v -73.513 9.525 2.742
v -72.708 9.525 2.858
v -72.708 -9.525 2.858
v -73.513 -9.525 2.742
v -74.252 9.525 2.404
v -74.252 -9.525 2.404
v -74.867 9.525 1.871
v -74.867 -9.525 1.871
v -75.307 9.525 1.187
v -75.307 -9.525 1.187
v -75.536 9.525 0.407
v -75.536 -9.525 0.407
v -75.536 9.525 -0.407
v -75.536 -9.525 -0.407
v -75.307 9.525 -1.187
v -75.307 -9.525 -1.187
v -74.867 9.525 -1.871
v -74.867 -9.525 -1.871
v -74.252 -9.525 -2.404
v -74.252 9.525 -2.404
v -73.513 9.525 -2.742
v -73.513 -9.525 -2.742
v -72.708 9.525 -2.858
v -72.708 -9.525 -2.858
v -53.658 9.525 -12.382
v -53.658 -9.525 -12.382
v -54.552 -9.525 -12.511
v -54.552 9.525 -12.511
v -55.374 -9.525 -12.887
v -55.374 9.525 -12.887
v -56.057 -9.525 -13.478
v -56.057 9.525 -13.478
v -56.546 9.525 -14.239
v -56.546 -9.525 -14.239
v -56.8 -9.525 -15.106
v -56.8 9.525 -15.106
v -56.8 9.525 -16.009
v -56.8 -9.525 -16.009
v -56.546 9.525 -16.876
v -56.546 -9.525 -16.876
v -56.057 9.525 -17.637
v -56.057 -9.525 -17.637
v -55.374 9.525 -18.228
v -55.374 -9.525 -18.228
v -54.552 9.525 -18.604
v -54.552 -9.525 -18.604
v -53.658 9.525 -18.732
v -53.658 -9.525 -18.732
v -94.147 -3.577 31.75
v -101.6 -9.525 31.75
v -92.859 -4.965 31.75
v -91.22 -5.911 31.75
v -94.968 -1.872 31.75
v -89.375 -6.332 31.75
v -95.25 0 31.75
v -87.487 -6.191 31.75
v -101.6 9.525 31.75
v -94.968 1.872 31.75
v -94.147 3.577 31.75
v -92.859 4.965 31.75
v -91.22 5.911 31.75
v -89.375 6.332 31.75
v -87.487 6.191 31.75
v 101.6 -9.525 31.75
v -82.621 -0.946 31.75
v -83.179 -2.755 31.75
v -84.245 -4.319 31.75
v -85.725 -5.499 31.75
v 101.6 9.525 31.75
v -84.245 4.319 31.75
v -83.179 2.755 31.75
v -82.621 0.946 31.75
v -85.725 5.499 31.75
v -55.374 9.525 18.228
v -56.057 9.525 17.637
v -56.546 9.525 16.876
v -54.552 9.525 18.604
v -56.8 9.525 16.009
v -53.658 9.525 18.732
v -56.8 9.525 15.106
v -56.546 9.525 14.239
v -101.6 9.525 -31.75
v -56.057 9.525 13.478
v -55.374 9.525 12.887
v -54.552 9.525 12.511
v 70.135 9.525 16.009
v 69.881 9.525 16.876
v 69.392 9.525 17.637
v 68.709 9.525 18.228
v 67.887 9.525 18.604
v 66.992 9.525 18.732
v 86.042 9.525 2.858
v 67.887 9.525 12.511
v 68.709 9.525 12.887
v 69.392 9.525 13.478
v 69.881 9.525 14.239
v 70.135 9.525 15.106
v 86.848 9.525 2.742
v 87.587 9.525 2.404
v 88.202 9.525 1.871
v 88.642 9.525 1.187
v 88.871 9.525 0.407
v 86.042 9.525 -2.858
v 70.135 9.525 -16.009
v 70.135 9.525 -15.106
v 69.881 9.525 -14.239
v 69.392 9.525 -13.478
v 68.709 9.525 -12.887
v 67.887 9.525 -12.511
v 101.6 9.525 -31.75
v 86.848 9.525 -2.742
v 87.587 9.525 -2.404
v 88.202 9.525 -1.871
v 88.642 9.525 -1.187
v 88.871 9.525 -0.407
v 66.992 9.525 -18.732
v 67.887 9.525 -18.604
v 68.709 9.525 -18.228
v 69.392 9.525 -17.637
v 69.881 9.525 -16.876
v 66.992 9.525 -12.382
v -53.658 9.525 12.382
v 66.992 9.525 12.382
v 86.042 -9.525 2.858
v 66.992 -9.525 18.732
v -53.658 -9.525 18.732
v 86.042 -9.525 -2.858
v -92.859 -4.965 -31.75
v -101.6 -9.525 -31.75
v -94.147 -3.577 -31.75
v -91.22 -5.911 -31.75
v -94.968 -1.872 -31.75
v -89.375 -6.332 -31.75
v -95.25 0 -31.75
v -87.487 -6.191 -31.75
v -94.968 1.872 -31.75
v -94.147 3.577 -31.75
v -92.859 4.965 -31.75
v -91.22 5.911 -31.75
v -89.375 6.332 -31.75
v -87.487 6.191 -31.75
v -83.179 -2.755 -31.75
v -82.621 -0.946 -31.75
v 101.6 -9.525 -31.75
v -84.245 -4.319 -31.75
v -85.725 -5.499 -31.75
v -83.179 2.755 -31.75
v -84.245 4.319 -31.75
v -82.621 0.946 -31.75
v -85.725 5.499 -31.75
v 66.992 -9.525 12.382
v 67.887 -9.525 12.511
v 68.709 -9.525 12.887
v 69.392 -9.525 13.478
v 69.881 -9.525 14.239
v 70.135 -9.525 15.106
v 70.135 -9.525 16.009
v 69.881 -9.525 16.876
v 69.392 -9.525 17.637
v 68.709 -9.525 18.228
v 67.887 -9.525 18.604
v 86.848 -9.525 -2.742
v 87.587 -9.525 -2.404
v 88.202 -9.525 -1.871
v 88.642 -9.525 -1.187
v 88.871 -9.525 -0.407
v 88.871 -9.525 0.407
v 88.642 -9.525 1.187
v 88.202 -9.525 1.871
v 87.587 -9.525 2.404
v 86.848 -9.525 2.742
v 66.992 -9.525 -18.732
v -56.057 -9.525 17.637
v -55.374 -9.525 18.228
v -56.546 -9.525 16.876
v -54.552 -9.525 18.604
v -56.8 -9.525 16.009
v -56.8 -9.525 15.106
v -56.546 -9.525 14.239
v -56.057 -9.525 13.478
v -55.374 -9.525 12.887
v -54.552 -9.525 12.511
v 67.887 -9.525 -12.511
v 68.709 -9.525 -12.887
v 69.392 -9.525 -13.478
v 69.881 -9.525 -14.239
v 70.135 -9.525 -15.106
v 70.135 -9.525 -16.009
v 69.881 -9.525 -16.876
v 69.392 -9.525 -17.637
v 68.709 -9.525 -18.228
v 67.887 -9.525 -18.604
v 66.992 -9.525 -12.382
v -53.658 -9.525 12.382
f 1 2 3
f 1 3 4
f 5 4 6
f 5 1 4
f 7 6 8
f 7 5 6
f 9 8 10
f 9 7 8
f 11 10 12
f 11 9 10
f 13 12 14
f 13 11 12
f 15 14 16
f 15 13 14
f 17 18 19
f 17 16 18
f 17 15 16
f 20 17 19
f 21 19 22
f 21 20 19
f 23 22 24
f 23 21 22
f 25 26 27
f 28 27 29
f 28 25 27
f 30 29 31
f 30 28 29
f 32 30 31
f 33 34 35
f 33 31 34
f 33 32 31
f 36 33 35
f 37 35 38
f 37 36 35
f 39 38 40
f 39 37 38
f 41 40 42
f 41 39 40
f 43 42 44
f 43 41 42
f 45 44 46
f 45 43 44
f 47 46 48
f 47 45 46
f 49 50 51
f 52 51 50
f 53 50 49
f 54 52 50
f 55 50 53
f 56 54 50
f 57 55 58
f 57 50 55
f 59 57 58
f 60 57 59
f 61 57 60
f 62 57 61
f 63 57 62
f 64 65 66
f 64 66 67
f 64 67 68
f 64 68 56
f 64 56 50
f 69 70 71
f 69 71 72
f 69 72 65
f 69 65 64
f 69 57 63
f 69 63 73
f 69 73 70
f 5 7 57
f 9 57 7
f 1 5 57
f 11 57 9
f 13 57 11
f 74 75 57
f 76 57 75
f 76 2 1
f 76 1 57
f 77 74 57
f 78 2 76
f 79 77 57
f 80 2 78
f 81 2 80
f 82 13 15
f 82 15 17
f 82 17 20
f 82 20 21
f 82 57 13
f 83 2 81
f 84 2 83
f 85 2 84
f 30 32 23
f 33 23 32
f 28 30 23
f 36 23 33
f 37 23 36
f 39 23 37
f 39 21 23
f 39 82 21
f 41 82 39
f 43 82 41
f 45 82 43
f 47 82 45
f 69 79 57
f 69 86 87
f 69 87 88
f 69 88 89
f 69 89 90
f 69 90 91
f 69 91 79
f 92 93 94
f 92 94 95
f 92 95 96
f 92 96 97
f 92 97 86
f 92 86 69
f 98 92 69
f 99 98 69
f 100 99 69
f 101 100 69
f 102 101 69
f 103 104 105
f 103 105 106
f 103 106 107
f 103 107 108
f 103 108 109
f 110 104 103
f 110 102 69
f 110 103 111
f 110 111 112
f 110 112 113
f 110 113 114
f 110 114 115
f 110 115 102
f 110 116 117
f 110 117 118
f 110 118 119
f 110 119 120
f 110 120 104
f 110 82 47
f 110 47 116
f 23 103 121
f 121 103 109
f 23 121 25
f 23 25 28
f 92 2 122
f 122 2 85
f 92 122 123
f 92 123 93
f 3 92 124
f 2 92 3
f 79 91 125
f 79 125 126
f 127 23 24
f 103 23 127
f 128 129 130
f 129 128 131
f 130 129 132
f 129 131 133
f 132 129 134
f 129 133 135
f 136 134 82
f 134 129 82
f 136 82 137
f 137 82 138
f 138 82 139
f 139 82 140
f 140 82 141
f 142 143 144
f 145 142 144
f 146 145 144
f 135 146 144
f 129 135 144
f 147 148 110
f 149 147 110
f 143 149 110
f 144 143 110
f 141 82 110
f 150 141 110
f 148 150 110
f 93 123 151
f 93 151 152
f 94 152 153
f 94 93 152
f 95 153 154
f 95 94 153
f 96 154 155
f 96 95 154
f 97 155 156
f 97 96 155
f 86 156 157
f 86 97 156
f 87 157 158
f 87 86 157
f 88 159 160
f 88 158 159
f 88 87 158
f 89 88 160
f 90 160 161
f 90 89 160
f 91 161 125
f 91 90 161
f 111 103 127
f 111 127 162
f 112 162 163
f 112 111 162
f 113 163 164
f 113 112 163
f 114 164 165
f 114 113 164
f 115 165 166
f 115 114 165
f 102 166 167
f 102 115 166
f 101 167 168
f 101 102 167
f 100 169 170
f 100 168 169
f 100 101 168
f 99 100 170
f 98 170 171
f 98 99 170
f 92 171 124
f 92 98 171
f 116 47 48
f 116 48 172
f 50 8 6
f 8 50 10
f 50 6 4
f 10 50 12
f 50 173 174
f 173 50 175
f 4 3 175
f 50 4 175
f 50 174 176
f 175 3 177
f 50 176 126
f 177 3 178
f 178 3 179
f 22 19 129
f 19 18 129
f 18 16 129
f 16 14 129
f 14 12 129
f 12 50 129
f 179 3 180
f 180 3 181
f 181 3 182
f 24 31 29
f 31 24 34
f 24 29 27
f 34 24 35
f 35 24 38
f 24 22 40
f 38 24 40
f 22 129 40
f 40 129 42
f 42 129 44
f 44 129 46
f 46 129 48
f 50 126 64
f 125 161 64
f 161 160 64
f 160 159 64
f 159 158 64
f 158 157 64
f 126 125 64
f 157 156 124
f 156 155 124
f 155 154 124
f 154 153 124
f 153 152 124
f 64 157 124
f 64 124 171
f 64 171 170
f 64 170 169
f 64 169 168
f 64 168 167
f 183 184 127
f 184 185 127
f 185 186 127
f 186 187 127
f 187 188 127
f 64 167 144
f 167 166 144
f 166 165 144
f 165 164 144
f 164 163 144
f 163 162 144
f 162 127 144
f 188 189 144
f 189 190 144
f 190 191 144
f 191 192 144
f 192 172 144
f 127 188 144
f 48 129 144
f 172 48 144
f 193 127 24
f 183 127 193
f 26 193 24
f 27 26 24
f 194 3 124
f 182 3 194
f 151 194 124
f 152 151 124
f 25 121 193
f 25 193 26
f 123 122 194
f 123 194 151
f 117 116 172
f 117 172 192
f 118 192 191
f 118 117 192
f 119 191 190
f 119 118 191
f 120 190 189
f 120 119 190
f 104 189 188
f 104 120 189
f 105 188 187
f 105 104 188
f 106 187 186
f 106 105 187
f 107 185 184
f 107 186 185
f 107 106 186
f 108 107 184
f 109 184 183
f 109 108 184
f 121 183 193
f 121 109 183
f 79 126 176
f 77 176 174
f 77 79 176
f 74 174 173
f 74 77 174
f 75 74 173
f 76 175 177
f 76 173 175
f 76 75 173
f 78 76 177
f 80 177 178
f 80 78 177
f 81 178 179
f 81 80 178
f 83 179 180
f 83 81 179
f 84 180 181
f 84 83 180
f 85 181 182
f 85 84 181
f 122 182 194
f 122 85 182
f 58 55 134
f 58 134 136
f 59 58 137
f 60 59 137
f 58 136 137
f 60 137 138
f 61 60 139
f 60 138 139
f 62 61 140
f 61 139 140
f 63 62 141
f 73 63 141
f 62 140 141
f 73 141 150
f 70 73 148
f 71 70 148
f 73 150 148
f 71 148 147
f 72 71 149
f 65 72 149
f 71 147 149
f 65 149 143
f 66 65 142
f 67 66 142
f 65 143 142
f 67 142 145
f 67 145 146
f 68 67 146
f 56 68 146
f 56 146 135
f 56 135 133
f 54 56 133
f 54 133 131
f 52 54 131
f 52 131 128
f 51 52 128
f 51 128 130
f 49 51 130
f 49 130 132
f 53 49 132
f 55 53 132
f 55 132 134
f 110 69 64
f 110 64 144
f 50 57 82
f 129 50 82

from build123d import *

# Parameters (mm, degrees)
SKETCH1_W           = 203.2
SKETCH1_H           = 63.5
BOSS_EXTRUDE1_DEPTH = 9.525
CUT_EXTRUDE1_DEPTH  = 109.136603424
CUT_EXTRUDE2_REACH  = 122.19
SKETCH3_R           = 6.35


with BuildPart() as part:
    # Sketch1 → Boss-Extrude1 (new, symmetric)
    with BuildSketch(Plane(origin=(0, 0, 0), x_dir=(1, 0, 0), z_dir=(0, 1, 0))):
        Rectangle(SKETCH1_W, SKETCH1_H)
    extrude(amount=BOSS_EXTRUDE1_DEPTH, both=True)

    # Sketch2 → Cut-Extrude1 (cut, through all)
    with BuildSketch(Plane(origin=(0, 9.525, 0), x_dir=(1, 0, 0), z_dir=(0, 1, 0))):
        with BuildLine():
            Line((-72.7075, 2.8575), (86.0425, 2.8575))
            ThreePointArc((86.0425, 2.8575), (88.9, 0), (86.0425, -2.8575))
            Line((86.0425, -2.8575), (-72.7075, -2.8575))
            ThreePointArc((-72.7075, -2.8575), (-75.565, 0), (-72.7075, 2.8575))
        make_face()
        with BuildLine():
            Line((-53.6575, 18.7325), (66.9925, 18.7325))
            ThreePointArc((66.9925, 18.7325), (70.1675, 15.5575), (66.9925, 12.3825))
            Line((66.9925, 12.3825), (-53.6575, 12.3825))
            ThreePointArc((-53.6575, 12.3825), (-56.8325, 15.5575), (-53.6575, 18.7325))
        make_face()
        with BuildLine():
            Line((-53.6575, -12.3825), (66.9925, -12.3825))
            ThreePointArc((66.9925, -12.3825), (70.1675, -15.5575), (66.9925, -18.7325))
            Line((66.9925, -18.7325), (-53.6575, -18.7325))
            ThreePointArc((-53.6575, -18.7325), (-56.8325, -15.5575), (-53.6575, -12.3825))
        make_face()
    extrude(amount=-CUT_EXTRUDE1_DEPTH, mode=Mode.SUBTRACT)

    # Sketch3 → Cut-Extrude2 (cut, up to next)
    with BuildSketch(Plane(origin=(0, 0, -31.75), x_dir=(-1, 0, 0), z_dir=(0, 0, -1)), mode=Mode.PRIVATE) as cut_extrude2_sk1:
        with Locations((88.9, 0)):
            Circle(SKETCH3_R)
    cut_extrude2_tool1 = extrude(cut_extrude2_sk1.sketch, amount=-CUT_EXTRUDE2_REACH, mode=Mode.PRIVATE) & part.part
    add(cut_extrude2_tool1.solids().sort_by_distance((-88.9, 0, -31.75))[0], mode=Mode.SUBTRACT)


solid = part.part
